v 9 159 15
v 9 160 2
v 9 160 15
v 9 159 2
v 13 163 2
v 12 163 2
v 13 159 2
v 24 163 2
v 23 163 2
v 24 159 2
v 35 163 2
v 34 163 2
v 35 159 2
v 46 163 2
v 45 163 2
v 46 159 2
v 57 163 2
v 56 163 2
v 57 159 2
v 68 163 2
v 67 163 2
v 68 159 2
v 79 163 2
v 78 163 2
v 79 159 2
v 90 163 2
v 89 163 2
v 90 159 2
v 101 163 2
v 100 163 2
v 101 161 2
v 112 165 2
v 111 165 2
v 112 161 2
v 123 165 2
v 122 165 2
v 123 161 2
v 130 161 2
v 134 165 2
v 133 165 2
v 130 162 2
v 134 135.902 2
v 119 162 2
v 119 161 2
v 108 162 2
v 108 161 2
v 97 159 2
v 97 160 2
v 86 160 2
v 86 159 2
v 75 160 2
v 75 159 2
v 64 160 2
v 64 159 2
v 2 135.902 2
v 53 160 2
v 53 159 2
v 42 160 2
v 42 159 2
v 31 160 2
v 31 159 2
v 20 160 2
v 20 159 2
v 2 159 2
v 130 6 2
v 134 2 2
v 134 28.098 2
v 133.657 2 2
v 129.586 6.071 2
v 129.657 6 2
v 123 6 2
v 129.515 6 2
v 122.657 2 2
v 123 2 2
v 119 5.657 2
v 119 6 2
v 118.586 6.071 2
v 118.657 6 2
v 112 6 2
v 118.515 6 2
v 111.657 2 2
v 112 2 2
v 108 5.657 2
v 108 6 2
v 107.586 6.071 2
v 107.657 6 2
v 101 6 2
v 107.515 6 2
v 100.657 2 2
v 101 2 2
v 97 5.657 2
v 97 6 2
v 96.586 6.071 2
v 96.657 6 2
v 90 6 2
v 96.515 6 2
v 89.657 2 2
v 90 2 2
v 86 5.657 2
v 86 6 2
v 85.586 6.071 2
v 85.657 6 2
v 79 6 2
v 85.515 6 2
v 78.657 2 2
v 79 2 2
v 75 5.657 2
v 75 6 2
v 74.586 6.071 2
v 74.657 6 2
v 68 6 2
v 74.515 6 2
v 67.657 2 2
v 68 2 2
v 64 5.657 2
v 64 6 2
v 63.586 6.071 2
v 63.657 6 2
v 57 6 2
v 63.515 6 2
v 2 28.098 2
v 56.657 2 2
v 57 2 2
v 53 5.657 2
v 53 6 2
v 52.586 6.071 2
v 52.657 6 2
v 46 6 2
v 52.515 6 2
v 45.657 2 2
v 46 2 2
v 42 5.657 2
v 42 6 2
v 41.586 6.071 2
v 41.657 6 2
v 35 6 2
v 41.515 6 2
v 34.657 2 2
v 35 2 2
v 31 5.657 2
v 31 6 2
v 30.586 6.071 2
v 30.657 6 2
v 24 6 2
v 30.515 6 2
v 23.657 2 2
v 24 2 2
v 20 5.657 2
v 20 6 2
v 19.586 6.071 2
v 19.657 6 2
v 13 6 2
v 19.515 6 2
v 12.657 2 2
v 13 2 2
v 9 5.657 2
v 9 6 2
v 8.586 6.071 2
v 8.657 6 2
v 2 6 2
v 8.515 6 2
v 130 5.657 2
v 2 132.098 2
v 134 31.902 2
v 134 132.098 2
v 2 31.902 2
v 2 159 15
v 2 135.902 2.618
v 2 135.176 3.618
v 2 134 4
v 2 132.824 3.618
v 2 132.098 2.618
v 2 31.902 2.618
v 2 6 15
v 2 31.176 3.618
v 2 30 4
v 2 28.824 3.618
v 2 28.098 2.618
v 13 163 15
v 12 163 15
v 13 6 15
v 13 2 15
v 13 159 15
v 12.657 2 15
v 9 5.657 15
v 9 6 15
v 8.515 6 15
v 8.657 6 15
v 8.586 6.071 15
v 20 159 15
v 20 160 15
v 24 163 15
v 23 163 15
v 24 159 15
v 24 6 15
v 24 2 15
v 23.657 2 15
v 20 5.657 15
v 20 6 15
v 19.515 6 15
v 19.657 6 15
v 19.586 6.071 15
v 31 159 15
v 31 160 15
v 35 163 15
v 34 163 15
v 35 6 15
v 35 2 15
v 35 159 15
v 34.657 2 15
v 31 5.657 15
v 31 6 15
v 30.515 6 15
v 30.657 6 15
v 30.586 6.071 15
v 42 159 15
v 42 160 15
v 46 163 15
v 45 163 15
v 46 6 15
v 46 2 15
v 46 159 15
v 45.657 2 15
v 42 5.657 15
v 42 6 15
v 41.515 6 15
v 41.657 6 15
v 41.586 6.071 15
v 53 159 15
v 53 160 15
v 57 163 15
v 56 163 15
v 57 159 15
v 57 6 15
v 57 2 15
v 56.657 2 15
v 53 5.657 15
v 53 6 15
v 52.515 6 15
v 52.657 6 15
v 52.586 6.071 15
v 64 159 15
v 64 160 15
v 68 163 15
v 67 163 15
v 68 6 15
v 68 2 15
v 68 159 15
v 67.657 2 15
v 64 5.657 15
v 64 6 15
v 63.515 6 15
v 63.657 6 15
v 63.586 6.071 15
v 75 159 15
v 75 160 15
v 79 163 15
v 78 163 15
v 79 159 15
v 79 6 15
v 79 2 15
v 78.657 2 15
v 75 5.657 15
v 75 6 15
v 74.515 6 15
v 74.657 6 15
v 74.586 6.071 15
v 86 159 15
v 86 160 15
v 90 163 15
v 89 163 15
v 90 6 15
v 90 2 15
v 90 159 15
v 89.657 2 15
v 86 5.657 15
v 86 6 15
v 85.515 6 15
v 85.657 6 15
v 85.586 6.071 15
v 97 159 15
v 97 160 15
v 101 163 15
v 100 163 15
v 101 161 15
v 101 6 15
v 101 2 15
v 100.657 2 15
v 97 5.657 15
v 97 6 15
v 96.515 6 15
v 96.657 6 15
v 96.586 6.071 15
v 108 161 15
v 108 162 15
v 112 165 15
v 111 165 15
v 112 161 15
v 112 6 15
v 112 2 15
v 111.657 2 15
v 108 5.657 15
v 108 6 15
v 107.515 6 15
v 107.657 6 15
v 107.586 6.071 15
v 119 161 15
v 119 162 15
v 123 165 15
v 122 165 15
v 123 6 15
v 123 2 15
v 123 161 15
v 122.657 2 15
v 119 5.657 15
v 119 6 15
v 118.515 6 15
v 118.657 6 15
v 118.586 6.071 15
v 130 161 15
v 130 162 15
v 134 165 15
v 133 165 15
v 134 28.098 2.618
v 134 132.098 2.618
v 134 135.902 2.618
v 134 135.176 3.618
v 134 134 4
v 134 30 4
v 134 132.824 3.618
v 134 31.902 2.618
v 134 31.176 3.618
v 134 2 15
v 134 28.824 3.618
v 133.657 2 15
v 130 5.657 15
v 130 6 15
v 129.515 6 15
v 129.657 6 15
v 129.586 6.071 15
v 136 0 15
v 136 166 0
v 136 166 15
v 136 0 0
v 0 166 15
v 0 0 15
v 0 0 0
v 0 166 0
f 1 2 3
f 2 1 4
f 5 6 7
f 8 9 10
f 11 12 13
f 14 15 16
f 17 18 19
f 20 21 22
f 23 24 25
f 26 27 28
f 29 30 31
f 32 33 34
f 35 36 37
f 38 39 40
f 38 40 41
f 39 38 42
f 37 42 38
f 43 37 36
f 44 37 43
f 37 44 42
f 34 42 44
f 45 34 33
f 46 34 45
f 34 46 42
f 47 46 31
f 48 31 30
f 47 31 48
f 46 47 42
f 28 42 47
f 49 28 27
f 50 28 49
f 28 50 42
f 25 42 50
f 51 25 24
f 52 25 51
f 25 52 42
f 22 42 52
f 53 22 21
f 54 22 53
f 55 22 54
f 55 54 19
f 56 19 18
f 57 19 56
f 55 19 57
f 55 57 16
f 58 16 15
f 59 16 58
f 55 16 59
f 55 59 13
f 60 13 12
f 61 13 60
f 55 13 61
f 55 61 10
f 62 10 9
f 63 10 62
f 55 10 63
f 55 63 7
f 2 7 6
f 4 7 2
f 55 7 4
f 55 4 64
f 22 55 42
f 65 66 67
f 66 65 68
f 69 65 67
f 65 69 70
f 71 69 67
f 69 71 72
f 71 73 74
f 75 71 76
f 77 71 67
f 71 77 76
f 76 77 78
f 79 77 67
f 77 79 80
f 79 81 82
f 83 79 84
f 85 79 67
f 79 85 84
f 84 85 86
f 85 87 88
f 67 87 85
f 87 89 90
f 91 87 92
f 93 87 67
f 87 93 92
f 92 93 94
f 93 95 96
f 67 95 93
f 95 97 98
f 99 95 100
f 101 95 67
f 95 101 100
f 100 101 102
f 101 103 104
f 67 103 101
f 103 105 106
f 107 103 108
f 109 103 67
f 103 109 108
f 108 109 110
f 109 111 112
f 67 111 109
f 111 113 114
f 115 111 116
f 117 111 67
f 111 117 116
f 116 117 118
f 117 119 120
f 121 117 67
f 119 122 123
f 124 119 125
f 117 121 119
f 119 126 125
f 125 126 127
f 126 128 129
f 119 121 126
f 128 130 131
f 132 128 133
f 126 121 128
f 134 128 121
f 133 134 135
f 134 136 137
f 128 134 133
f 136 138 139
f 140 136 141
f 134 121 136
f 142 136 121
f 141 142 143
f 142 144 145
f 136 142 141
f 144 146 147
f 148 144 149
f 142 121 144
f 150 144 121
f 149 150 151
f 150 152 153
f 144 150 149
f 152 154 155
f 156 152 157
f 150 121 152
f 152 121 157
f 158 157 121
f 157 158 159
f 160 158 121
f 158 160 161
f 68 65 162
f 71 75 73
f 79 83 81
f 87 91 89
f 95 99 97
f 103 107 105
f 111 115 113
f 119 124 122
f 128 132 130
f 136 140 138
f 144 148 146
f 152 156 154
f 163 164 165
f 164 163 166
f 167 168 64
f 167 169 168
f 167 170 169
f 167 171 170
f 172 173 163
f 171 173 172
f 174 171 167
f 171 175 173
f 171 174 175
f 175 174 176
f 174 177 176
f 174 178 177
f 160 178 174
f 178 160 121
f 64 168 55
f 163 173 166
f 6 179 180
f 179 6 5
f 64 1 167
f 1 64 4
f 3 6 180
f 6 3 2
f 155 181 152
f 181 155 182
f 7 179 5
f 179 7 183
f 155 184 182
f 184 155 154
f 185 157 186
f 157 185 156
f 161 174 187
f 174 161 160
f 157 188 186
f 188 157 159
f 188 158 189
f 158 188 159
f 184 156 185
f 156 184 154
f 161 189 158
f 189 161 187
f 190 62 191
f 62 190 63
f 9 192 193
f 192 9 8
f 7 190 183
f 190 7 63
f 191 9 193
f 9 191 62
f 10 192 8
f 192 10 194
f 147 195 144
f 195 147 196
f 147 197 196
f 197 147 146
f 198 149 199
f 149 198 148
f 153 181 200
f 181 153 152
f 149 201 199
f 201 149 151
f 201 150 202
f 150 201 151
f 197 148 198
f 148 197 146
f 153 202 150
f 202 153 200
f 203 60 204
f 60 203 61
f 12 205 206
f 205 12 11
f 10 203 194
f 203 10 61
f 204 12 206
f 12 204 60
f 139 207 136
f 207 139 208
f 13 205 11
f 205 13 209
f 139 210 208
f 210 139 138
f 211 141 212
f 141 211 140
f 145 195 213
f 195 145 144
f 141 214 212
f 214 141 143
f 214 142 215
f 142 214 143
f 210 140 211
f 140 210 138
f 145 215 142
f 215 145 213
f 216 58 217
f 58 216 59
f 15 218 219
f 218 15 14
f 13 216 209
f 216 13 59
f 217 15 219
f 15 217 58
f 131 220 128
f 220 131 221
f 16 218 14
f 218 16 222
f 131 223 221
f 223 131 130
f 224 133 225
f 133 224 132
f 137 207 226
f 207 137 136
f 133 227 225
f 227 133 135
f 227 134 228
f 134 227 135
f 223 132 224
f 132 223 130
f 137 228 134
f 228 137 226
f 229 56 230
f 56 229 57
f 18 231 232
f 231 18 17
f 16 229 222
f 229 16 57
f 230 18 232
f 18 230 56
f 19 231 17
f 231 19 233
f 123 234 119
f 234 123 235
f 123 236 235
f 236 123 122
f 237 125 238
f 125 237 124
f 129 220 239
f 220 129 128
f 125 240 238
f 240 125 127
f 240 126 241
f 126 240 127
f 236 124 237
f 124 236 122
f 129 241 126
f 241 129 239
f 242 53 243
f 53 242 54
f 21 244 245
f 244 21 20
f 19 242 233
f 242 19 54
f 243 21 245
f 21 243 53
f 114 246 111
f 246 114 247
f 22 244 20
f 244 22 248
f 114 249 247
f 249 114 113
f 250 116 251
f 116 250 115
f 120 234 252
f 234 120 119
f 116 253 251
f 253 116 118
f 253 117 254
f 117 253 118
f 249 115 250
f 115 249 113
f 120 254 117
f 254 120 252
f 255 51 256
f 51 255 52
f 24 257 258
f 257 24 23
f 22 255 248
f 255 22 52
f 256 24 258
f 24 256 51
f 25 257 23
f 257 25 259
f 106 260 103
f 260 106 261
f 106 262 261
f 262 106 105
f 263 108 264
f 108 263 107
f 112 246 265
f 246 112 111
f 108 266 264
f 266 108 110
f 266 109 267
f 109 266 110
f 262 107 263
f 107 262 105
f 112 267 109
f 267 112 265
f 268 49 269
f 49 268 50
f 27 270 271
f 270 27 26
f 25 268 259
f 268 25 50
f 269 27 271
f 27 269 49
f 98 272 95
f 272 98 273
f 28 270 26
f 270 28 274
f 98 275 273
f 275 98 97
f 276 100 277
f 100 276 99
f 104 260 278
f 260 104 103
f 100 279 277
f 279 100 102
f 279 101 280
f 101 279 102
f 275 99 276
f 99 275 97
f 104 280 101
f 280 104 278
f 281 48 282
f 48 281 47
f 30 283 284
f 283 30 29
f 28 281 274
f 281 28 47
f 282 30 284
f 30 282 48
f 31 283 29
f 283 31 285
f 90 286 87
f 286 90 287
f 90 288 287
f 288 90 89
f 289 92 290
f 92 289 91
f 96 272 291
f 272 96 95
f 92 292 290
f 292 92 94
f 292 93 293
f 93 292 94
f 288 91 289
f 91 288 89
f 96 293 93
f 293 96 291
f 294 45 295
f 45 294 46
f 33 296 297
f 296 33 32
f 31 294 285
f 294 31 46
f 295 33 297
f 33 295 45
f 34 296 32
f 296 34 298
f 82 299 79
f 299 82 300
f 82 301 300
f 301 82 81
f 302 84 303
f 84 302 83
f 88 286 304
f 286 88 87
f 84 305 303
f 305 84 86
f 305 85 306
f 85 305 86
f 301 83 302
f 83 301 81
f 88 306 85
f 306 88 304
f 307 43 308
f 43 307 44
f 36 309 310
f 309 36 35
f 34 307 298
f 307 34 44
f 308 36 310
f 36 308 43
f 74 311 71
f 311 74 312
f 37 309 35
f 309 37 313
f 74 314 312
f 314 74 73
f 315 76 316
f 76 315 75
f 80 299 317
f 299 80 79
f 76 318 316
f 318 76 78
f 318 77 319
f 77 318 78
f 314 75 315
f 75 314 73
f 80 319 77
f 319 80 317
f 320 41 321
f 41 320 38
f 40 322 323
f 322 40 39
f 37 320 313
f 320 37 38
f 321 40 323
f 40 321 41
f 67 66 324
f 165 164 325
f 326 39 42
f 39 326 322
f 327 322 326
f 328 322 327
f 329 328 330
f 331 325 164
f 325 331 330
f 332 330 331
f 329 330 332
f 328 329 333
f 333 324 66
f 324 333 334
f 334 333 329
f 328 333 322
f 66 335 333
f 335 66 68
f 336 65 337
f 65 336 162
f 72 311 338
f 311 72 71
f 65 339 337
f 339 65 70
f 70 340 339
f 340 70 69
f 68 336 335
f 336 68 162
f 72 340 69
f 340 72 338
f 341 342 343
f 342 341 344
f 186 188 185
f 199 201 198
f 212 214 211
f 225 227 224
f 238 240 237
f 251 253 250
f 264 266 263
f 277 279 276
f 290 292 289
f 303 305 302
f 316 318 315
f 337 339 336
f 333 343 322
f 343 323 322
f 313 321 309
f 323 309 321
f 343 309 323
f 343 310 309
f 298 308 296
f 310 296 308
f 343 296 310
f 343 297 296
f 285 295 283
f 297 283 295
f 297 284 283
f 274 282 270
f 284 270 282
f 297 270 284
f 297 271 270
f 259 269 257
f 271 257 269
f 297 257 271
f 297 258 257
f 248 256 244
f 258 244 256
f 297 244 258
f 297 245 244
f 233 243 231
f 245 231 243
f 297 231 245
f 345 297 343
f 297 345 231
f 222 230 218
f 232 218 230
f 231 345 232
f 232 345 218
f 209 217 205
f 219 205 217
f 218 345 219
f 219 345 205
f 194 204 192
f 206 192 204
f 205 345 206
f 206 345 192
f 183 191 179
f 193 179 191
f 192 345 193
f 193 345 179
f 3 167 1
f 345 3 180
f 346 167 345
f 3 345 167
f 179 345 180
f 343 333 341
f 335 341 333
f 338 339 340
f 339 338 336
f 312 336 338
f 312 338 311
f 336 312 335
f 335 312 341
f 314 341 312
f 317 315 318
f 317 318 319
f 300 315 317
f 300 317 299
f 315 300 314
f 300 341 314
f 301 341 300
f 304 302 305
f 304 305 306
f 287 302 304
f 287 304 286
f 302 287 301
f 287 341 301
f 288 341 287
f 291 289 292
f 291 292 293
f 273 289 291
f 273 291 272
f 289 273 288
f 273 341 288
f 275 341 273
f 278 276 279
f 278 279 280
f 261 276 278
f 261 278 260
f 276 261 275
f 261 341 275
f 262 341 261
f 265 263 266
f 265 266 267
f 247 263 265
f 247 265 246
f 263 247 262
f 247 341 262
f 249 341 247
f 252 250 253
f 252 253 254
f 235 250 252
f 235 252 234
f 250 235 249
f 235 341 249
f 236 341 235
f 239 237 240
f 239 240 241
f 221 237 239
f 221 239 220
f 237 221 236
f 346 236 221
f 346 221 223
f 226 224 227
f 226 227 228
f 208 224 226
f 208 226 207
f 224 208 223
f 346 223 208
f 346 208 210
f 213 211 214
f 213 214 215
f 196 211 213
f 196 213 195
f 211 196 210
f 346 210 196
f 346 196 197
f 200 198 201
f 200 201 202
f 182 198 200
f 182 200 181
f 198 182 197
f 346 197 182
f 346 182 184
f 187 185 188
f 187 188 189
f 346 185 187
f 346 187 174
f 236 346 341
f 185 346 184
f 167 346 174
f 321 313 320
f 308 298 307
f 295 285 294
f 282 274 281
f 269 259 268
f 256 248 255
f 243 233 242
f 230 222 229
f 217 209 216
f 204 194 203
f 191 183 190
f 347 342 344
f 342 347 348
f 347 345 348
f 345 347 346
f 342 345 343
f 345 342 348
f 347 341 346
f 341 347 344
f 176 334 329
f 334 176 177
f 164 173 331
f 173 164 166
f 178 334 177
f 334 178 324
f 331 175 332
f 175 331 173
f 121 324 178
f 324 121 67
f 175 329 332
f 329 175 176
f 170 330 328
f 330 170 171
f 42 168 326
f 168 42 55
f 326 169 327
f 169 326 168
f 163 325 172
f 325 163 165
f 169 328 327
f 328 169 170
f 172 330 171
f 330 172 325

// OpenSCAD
slots_stone=9;
slots_diamant=3;
slot_width=11;
box_Z=11;

slots=(slots_stone+slots_diamant);
difference(){
    cube([slot_width*slots+4,155+5+6,box_Z+2+2]);
    //translate([2,2+2.5,2])cube([12*slots,156,22+2]);
    for(i=[0:1:slots_stone-1]){
        translate([2+(i*slot_width),2,2])brousek(161);
    }
    for(i=[0:1:slots_diamant-1]){
        translate([2+((i+slots_stone)*slot_width),2,2])brousek(163);
    }
    
};
translate([0,30,2])rotate([0,90,0])cylinder(d=4,h=slot_width*slots+4,$fn=10);
translate([0,155+5+4-30,2])rotate([0,90,0])cylinder(d=4,h=slot_width*slots+4,$fn=10);



module brousek(length){
    zet=25;//original=23
    difference(){
        cube([slot_width,length,zet]);
        cube([slot_width-4,4,zet]);
        translate([slot_width-3,-3,0])rotate([0,0,45])cube([4,6,zet]);
        translate([0,length-4,0]){
            cube([slot_width-4,4,zet]);
            translate([slot_width-4,1,0])rotate([0,0,45])cube([6,6,zet]);
        }
        
    }
}
